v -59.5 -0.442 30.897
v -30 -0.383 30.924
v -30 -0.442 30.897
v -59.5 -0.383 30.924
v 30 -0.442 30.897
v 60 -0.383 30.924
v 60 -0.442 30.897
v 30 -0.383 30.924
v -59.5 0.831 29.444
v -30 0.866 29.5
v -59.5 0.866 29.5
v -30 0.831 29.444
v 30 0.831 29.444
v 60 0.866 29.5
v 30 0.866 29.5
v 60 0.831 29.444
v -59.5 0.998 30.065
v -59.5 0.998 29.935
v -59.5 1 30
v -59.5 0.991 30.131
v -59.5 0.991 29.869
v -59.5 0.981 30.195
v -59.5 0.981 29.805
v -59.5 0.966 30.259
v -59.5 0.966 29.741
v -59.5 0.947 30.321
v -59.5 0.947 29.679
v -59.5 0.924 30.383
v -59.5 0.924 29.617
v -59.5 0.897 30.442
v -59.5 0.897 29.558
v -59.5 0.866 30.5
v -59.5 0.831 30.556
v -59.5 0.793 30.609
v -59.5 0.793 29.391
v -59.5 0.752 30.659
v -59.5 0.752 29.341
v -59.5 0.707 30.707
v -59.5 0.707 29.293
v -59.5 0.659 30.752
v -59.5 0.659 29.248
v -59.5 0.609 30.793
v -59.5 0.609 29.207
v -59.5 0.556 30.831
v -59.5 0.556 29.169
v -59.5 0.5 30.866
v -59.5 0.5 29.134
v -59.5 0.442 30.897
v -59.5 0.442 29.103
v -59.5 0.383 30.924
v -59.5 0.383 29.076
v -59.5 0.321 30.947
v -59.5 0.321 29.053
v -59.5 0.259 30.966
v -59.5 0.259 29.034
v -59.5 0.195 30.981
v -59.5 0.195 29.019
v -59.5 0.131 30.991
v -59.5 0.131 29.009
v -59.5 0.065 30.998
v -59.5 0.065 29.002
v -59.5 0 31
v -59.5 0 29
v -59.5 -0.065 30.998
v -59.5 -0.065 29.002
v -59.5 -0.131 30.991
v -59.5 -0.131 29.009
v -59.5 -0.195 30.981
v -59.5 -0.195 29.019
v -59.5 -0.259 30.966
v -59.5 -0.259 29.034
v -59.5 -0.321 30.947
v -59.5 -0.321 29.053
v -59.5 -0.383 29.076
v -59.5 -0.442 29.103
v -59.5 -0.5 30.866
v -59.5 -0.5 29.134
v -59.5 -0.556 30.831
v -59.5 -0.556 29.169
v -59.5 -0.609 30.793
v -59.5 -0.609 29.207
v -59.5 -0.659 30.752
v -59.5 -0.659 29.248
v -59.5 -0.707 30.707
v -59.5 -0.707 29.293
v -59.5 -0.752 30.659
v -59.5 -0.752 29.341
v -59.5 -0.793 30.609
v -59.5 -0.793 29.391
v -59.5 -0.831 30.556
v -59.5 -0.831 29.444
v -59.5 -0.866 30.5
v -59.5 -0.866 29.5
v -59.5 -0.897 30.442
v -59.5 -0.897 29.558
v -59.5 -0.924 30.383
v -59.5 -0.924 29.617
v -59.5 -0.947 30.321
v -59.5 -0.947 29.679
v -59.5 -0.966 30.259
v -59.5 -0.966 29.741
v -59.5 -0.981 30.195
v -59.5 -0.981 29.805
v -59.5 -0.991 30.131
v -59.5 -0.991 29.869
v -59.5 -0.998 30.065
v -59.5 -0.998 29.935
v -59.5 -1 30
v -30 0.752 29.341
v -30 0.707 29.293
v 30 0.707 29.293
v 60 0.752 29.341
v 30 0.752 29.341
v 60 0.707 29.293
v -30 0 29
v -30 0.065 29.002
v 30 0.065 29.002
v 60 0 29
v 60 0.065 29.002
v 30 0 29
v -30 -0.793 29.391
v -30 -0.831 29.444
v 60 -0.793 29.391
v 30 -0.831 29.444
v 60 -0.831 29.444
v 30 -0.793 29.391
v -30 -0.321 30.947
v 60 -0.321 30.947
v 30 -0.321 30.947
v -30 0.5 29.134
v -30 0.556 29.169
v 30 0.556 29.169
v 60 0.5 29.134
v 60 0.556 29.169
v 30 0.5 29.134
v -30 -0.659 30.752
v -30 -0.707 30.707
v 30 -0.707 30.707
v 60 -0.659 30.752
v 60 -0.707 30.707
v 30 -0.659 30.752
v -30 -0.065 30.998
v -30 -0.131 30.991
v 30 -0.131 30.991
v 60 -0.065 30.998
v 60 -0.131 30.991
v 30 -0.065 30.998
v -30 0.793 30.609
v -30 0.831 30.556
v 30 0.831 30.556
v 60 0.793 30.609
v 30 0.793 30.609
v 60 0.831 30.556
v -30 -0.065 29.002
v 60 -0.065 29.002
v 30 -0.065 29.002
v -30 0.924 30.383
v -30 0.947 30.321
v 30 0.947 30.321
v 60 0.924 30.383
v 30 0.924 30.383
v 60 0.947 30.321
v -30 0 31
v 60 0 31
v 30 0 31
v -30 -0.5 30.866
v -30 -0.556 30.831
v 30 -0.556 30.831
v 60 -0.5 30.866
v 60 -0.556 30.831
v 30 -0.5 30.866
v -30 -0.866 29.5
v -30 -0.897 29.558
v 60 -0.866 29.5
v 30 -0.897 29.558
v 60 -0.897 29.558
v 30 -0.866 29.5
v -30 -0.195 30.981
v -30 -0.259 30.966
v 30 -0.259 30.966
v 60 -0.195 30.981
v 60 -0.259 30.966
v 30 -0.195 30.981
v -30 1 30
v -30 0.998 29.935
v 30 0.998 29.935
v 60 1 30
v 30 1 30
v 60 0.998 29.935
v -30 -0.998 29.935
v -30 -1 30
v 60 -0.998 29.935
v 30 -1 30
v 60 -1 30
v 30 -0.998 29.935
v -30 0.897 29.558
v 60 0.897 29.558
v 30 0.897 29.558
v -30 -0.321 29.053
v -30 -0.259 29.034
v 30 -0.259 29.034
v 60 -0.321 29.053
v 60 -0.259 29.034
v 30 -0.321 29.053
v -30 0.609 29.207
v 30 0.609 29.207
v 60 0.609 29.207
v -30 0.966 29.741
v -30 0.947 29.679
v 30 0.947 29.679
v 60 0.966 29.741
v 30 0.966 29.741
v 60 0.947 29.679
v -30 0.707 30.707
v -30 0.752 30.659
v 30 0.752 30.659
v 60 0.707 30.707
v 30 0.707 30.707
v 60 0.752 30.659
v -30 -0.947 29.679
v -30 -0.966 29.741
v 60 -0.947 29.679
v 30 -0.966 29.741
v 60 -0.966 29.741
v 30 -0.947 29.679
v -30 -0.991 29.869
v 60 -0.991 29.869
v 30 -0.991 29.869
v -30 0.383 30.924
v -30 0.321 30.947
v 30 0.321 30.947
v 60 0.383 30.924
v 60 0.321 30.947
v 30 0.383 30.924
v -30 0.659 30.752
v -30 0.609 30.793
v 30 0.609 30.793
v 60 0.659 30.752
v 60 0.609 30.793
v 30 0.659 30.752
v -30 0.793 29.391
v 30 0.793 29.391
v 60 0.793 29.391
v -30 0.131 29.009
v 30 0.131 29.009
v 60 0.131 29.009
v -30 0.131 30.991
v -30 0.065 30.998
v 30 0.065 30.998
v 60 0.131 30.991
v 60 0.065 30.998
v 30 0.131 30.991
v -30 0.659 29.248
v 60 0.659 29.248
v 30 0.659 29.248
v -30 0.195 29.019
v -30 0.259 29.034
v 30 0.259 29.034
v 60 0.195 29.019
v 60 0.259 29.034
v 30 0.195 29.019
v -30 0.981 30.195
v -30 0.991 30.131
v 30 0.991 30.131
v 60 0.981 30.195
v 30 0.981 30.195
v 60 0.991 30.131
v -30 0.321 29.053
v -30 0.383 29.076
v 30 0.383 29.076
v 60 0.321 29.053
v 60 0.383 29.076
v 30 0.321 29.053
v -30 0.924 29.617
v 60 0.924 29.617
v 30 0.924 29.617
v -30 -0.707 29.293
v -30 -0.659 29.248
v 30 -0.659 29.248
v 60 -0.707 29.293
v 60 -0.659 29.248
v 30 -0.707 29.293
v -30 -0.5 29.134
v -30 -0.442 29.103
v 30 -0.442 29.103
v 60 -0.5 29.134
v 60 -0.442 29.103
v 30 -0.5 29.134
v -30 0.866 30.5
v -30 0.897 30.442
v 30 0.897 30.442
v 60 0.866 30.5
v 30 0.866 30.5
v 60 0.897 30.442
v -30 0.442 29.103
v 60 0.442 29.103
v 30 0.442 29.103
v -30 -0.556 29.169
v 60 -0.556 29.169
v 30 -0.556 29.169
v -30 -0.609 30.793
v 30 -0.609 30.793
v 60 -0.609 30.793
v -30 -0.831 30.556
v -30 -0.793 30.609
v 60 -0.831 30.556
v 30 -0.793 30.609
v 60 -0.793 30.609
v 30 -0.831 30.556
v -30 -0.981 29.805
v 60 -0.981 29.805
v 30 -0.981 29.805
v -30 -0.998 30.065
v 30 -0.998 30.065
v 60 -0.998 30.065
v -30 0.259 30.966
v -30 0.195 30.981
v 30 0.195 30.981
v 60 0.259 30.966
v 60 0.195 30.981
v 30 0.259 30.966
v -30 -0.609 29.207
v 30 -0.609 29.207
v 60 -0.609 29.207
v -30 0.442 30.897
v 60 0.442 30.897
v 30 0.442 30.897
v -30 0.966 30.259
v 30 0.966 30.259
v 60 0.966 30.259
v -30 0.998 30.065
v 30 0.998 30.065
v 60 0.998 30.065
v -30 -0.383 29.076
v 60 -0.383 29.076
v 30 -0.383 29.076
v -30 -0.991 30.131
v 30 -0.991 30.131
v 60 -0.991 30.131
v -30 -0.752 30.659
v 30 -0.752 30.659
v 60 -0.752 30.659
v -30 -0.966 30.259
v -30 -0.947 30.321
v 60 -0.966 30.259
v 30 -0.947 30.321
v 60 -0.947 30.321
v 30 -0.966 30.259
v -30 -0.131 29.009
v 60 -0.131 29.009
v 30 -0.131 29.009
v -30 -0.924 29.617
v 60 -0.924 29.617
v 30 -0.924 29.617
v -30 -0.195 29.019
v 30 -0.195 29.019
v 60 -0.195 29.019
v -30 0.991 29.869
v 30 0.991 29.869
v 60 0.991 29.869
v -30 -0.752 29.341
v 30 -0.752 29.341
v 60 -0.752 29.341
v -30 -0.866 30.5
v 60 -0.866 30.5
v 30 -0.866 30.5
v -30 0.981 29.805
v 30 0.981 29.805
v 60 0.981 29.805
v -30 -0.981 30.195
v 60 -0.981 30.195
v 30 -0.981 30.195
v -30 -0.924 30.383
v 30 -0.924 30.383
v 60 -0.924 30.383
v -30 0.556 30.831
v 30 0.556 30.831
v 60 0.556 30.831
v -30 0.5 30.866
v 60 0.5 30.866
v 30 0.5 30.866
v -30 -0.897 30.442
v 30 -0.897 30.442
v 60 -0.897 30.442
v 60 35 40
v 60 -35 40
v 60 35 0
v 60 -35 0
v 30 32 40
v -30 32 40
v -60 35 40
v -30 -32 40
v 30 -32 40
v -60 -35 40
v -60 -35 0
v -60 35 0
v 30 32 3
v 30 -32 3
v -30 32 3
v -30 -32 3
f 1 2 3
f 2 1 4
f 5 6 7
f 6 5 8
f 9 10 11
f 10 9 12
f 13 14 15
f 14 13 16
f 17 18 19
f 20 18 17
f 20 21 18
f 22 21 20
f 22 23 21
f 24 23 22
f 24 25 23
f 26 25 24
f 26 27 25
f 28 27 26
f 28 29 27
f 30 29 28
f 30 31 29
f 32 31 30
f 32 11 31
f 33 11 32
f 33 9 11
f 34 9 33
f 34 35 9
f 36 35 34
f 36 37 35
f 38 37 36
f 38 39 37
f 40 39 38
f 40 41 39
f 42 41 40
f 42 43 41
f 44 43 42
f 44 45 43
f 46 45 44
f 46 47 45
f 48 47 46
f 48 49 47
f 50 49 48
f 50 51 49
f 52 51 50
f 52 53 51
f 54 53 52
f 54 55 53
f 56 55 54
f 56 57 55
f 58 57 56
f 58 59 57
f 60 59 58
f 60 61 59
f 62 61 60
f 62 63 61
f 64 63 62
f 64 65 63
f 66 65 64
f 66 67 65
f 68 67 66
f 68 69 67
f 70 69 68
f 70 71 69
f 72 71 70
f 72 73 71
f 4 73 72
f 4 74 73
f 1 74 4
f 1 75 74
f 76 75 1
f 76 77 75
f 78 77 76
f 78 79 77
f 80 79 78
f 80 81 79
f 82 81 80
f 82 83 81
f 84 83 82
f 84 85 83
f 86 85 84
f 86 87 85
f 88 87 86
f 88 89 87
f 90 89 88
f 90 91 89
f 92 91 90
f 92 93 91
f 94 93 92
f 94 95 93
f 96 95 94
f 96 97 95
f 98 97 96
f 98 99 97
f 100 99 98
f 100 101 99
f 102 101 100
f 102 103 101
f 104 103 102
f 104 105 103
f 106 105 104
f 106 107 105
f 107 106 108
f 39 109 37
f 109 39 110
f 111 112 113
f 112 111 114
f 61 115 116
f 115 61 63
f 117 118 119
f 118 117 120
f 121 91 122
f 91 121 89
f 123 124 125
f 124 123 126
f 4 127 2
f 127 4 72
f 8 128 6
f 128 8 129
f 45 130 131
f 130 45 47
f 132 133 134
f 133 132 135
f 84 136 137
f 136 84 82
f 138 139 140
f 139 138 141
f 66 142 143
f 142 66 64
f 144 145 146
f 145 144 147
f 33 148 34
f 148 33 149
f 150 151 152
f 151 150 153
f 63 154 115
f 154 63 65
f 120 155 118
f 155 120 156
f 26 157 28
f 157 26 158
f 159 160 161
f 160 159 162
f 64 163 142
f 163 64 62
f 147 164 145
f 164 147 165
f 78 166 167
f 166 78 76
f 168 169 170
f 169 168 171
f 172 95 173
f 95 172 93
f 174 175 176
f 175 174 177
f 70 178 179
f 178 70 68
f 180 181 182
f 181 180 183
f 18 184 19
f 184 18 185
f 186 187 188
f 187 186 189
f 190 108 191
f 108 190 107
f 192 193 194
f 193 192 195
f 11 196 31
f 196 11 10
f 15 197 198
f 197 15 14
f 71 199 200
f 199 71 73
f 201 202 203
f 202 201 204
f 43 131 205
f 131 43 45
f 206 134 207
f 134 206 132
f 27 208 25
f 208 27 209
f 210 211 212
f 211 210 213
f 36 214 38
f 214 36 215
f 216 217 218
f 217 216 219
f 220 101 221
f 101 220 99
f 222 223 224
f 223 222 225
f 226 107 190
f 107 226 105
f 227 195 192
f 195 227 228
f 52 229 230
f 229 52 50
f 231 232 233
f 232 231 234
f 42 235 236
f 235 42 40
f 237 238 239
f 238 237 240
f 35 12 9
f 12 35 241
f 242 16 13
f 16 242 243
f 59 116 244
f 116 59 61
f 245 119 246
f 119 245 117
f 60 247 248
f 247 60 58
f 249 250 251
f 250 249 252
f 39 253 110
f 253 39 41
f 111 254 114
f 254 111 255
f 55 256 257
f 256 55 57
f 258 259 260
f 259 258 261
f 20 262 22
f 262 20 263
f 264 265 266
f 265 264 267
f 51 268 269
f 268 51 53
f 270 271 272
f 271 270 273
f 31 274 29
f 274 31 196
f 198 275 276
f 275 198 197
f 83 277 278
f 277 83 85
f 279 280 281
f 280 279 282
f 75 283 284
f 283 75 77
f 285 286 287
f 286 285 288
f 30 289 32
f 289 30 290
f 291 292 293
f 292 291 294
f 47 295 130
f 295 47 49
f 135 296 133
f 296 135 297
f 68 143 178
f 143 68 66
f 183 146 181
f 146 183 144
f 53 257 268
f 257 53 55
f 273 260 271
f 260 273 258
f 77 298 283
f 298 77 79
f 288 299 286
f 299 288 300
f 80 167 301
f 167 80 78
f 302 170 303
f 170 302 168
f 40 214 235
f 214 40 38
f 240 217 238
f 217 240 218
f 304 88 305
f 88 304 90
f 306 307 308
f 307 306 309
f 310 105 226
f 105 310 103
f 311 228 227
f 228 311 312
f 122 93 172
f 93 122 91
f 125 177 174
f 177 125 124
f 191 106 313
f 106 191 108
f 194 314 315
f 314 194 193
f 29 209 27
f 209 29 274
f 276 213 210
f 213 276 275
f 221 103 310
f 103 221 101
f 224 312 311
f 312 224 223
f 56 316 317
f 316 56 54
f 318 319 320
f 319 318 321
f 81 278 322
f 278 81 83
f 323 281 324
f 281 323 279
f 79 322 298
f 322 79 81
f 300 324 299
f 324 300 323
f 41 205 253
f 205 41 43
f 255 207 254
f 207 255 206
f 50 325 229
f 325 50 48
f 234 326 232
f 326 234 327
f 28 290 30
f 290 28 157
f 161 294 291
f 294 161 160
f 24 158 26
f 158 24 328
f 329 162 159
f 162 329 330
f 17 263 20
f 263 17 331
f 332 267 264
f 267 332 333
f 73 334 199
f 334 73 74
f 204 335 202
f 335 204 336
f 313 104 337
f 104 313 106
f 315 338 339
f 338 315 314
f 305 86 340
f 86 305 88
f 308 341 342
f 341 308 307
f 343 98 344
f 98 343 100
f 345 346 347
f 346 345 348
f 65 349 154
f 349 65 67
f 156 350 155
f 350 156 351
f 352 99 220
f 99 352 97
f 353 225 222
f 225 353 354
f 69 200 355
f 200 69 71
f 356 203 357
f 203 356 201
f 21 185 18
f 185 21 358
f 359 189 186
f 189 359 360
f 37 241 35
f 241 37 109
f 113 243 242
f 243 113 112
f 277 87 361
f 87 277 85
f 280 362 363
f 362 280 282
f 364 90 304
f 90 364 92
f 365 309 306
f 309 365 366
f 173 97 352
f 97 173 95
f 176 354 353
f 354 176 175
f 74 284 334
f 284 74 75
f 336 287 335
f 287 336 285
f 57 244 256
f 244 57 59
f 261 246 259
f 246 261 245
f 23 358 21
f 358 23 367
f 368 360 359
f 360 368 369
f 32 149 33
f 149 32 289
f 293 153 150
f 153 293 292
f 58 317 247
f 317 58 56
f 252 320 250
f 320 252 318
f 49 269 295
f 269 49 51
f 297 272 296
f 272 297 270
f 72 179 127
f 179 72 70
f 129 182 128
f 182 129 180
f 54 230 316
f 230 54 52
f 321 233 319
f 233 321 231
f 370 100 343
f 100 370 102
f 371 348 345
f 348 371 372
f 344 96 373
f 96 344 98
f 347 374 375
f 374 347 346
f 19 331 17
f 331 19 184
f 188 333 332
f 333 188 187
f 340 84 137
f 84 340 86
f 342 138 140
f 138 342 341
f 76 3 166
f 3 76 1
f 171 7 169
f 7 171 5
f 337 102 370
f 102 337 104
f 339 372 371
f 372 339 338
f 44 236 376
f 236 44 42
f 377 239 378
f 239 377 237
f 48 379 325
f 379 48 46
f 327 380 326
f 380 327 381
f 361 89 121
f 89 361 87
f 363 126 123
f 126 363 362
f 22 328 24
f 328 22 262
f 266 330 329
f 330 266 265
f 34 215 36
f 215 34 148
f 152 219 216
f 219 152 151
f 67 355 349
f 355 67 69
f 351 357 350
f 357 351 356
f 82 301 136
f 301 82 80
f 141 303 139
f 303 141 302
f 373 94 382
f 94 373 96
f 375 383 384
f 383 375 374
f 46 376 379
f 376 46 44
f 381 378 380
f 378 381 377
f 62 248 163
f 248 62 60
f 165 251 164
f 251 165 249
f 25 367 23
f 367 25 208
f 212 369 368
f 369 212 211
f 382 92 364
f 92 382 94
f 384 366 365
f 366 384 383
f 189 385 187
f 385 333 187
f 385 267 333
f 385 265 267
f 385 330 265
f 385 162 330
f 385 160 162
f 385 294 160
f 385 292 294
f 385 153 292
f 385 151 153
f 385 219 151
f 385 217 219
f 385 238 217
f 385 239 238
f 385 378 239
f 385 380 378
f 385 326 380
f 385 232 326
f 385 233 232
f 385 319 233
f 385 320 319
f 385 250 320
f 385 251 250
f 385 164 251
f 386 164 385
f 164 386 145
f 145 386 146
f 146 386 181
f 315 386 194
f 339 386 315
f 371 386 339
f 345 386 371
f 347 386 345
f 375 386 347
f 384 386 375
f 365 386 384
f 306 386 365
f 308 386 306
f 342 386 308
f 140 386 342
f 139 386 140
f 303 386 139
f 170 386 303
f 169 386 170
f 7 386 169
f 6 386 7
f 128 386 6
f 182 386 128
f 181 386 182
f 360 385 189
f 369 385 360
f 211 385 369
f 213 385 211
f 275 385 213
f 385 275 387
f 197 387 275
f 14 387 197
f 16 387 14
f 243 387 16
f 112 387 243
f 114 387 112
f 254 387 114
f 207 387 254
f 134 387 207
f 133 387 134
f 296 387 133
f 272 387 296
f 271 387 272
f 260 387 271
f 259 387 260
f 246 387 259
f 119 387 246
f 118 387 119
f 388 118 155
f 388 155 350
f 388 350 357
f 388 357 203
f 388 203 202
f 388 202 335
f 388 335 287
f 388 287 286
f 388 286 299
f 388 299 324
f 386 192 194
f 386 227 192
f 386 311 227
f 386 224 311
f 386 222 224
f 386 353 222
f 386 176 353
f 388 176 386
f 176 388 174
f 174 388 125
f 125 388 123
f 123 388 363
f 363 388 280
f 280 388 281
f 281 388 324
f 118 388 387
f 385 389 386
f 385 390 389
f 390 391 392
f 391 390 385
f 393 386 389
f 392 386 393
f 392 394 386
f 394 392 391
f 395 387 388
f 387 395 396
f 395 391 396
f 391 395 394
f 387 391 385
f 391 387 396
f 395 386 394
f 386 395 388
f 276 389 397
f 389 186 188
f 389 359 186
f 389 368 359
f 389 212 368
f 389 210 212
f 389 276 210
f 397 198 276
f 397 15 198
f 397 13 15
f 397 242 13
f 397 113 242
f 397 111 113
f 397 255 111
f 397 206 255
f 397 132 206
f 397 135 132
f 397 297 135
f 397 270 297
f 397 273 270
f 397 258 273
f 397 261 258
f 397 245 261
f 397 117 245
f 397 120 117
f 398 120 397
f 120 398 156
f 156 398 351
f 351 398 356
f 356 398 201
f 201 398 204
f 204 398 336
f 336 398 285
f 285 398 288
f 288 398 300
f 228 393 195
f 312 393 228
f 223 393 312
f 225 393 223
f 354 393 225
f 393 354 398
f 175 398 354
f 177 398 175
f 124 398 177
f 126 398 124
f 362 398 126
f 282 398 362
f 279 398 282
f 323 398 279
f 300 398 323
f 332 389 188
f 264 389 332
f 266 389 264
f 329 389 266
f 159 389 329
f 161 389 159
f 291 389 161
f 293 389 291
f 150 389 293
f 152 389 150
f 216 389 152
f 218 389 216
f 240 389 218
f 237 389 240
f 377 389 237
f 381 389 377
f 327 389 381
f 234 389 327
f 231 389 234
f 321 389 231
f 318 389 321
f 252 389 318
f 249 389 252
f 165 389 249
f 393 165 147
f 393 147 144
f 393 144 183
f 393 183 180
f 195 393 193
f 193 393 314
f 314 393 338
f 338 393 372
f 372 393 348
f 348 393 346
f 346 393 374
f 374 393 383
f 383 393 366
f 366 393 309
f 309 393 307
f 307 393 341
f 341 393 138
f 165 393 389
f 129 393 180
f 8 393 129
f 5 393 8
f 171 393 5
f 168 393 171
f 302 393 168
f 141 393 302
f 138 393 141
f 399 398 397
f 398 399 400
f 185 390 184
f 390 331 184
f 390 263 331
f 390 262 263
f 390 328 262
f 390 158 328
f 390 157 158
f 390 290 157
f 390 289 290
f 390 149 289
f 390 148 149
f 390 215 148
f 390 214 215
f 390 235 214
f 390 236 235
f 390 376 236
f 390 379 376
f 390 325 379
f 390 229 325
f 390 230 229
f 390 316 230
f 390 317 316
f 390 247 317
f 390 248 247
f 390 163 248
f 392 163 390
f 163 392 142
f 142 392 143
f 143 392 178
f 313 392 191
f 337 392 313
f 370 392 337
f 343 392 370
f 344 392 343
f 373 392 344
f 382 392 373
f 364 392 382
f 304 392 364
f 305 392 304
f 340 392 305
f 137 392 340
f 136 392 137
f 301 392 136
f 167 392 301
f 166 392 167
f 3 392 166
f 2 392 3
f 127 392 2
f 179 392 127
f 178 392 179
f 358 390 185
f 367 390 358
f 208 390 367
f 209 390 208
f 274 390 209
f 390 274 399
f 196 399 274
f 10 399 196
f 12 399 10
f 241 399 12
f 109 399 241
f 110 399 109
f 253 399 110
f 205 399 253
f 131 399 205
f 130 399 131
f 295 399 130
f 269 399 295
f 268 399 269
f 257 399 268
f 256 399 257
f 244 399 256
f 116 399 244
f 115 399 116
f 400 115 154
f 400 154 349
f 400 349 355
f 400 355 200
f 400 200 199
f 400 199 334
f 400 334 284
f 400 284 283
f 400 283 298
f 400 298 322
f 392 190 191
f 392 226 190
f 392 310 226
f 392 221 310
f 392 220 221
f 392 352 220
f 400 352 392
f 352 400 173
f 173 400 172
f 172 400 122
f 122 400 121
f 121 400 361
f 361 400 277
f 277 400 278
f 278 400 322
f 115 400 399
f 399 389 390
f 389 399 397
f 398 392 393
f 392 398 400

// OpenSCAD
// Mini horizontal gel-electrophoresis box - buffer tank
// Print orientation: open top facing up (+Z), resting on XY plane at z = 0

// ---------- Parameters ----------
outer_x   = 120;   // outer length along X (mm)
outer_y   = 70;    // outer width along Y (mm)
outer_z   = 40;    // outer height along Z (mm)
wall      = 3;     // wall thickness (mm)
floor     = 3;     // floor thickness (mm)

platform_x = 60;   // platform length along X (mm), centred
platform_y = outer_y - 2 * wall; // platform spans full inner width (mm)
platform_top = outer_z - wall - floor + 10; // platform top height, 10 mm above inner floor (mm)

hole_d = 2;        // electrode hole diameter (mm)
hole_y = 0;        // electrode hole Y position (mm)
hole_z = 30;       // electrode hole Z position (mm)

eps = 0.5;         // cutter overshoot past faces (mm)

$fn = 96;

// ---------- Model ----------
difference() {
    // Main tank body
    translate([-outer_x / 2, -outer_y / 2, 0])
        cube([outer_x, outer_y, outer_z]);

    // Raised platform for gel tray
    translate([-platform_x / 2, -platform_y / 2, floor])
        cube([platform_x, platform_y, platform_top - floor]);

    // Horizontal electrode holes through end walls along X
    for (s = [-1, 1])
        translate([s > 0 ? outer_x / 2 - eps : -outer_x / 2 + eps, hole_y, hole_z])
            rotate([0, 90, 0])
                cylinder(d = hole_d, h = outer_x + 2 * eps);
}
